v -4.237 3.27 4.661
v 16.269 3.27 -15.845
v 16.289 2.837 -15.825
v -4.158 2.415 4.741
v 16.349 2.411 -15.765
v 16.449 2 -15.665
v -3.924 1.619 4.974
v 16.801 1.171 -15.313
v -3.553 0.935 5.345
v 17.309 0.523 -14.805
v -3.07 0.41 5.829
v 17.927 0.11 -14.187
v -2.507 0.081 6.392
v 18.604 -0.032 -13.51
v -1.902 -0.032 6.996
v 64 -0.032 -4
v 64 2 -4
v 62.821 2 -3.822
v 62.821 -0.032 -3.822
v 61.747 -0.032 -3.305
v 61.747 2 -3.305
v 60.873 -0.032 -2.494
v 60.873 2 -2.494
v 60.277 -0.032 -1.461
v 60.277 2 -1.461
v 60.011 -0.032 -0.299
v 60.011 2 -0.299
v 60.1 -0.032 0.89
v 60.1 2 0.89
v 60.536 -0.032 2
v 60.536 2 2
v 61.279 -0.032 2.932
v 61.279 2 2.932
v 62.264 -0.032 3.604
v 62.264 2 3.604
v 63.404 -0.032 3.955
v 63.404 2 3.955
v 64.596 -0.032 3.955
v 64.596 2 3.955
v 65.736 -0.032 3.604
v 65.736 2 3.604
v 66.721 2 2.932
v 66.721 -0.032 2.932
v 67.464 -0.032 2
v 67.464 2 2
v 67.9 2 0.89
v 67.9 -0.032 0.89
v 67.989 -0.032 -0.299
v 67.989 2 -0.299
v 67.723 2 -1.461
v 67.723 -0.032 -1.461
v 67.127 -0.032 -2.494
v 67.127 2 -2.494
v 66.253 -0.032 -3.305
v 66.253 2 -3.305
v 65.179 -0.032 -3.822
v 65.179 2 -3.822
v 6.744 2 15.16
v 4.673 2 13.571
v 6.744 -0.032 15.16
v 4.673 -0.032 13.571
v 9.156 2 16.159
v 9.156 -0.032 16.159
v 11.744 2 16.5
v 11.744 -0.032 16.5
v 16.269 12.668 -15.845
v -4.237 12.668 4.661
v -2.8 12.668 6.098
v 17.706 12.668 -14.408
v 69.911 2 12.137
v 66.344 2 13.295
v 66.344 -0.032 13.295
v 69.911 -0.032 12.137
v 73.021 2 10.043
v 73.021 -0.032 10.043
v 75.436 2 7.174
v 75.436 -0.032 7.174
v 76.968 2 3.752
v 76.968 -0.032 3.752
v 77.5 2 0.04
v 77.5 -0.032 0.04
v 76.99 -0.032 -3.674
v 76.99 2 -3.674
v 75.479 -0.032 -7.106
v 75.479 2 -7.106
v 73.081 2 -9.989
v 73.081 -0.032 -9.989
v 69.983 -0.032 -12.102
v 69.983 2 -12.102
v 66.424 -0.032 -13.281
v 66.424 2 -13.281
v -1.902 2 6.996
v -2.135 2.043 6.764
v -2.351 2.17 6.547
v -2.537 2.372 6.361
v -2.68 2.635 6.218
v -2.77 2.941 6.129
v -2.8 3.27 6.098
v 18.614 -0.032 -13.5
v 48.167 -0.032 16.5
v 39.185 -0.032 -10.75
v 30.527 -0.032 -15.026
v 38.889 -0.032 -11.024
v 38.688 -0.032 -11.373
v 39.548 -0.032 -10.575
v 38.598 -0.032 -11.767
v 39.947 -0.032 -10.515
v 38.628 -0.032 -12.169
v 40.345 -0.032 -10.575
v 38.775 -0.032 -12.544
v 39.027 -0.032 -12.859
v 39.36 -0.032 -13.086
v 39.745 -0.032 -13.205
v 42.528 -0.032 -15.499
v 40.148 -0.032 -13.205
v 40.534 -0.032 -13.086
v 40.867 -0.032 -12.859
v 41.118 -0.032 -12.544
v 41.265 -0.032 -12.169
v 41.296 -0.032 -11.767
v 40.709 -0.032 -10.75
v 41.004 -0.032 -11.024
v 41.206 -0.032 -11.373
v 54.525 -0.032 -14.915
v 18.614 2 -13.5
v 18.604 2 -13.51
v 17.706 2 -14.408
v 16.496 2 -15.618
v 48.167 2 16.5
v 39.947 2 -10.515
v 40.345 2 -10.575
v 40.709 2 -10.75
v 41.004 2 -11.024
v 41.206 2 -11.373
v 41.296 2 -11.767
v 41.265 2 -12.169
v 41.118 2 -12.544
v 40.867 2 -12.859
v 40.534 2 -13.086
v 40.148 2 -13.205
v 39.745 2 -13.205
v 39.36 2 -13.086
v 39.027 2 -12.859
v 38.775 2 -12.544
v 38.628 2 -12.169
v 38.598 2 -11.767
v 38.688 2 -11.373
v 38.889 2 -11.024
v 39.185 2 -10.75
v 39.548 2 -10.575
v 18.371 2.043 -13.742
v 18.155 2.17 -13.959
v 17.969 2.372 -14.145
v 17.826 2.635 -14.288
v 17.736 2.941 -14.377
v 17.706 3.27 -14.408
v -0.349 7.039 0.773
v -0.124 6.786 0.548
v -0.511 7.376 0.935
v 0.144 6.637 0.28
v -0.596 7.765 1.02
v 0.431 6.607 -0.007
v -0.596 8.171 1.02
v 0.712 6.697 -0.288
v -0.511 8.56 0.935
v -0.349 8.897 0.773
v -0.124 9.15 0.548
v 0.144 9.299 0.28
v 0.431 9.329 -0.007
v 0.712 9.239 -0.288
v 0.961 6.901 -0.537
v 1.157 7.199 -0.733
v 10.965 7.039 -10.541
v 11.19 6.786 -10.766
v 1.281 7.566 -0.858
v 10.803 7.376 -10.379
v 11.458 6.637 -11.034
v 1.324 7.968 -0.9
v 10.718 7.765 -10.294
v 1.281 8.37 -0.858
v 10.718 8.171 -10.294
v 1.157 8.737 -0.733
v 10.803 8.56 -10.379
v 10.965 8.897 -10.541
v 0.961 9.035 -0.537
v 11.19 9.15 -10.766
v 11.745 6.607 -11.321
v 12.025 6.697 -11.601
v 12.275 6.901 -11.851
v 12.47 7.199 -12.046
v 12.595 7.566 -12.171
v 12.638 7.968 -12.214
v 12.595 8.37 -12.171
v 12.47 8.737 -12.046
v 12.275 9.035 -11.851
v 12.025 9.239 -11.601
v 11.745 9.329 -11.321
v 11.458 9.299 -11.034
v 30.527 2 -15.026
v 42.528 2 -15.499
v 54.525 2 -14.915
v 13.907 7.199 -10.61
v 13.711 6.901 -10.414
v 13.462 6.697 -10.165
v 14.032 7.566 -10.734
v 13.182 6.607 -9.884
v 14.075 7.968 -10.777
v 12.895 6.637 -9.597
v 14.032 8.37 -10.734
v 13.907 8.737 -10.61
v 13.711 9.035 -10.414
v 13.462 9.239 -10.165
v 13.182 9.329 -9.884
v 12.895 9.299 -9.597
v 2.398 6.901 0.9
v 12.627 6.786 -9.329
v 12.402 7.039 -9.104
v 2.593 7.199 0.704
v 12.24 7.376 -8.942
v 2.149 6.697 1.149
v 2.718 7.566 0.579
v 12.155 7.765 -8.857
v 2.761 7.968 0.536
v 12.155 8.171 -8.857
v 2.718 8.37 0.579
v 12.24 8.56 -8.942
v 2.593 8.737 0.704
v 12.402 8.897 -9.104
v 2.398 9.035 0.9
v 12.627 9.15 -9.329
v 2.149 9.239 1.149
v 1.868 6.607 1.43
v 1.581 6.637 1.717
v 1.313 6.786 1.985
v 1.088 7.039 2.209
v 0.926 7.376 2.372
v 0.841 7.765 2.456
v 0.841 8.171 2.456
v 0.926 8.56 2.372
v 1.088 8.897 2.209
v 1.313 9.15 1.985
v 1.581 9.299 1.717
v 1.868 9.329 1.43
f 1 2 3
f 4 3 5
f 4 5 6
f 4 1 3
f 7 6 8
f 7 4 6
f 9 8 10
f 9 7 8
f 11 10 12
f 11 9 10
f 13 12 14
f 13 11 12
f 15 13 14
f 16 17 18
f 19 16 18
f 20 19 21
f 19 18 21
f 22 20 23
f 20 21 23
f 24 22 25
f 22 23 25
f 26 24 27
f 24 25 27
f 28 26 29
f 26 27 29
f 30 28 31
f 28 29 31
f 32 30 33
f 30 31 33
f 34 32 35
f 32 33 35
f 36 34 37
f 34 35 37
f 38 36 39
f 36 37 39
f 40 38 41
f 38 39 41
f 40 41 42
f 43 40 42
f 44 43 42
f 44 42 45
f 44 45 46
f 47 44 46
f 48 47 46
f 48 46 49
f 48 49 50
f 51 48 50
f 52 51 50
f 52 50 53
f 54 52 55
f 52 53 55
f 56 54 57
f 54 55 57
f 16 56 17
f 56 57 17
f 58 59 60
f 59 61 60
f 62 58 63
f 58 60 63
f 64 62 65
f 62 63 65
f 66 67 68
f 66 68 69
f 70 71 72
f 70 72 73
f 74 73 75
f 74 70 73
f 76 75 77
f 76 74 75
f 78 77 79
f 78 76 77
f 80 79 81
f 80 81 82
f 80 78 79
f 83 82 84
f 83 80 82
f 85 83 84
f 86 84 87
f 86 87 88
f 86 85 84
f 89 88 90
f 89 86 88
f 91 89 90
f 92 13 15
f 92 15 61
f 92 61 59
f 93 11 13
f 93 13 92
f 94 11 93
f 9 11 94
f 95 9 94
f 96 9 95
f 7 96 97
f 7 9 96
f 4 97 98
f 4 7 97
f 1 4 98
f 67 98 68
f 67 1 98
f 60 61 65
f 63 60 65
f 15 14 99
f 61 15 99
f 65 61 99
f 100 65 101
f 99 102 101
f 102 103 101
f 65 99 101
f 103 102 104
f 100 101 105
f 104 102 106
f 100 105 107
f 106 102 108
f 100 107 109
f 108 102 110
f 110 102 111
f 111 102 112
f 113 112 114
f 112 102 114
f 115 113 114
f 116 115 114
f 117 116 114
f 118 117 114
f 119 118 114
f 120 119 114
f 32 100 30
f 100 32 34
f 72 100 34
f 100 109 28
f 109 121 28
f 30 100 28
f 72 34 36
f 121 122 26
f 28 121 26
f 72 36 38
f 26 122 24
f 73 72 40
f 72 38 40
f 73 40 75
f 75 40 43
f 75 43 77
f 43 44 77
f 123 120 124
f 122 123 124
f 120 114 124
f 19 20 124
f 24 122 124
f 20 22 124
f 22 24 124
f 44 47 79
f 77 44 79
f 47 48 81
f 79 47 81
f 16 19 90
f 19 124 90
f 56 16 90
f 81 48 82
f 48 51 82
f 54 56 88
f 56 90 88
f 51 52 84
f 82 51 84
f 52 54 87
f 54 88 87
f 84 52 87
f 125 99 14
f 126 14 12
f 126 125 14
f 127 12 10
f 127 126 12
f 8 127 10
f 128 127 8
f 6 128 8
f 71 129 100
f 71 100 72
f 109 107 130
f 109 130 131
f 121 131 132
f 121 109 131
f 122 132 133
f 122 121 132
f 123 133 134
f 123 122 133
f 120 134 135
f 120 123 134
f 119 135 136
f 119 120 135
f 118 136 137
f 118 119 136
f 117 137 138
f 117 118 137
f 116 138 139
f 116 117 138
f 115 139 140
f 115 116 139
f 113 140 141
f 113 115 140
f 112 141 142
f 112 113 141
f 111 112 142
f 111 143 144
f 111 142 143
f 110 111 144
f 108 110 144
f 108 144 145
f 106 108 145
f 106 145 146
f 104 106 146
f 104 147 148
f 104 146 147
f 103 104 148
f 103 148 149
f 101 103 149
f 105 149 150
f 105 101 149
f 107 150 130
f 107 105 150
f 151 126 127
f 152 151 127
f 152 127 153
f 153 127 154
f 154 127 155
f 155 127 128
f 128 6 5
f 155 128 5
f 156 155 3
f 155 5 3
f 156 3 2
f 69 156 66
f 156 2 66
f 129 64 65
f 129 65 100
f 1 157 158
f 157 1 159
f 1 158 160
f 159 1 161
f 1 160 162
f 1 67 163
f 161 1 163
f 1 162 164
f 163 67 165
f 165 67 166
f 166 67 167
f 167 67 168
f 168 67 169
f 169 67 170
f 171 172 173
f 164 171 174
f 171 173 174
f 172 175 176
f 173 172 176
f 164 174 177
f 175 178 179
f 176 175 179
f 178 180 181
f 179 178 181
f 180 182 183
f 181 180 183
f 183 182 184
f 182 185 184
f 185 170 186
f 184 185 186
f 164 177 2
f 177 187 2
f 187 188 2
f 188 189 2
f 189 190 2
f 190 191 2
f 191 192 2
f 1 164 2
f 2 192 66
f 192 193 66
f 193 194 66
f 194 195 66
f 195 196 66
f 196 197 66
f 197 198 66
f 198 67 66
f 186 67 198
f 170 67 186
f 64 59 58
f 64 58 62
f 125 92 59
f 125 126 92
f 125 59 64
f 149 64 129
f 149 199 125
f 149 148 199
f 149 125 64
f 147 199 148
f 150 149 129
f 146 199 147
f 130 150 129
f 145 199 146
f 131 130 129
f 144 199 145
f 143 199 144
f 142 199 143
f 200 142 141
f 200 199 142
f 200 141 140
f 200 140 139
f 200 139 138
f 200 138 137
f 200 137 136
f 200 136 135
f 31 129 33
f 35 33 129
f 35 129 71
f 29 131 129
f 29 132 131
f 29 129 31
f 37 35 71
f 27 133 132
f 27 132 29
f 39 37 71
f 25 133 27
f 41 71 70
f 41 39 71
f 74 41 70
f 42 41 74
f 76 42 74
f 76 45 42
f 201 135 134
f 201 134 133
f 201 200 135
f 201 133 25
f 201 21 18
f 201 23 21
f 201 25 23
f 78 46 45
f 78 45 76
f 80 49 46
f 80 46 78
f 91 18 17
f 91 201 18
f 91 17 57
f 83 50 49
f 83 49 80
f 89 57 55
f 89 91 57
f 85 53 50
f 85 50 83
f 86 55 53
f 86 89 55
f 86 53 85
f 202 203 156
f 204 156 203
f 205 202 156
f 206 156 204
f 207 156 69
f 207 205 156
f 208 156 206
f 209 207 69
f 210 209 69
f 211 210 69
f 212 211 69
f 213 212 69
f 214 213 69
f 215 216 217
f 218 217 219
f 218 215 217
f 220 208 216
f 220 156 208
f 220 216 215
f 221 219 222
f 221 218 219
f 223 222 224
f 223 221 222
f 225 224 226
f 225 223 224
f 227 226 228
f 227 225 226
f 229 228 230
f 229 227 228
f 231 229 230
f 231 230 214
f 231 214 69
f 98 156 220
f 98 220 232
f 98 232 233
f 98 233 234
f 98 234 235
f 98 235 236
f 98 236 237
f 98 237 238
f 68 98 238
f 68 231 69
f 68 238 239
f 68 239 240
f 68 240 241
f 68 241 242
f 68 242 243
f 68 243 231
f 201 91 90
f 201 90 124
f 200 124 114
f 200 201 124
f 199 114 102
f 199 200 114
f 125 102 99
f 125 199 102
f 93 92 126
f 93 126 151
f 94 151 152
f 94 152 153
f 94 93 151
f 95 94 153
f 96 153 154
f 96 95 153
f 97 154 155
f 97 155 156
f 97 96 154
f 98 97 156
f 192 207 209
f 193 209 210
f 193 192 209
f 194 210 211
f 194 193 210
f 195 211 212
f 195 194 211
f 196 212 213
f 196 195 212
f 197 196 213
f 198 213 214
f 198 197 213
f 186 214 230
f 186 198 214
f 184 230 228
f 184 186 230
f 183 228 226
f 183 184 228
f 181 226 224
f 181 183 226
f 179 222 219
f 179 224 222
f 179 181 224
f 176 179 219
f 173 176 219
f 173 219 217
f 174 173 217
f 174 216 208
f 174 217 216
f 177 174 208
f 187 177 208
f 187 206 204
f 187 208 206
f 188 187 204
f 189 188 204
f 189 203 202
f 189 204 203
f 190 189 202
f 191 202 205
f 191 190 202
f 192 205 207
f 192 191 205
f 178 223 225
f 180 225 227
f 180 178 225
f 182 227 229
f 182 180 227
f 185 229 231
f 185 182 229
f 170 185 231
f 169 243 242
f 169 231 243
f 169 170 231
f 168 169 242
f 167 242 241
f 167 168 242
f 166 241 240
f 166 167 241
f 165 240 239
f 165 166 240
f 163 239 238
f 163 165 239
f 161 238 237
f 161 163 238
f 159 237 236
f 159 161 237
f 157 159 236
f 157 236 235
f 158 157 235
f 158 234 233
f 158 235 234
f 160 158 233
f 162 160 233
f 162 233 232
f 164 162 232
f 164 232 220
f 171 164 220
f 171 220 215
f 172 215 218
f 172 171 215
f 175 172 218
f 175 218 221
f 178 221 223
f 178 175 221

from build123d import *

# Parameters (mm, degrees)
SKETCH1_R                  = 4
BOSS_EXTRUDE1_DEPTH        = 2.032
BOSS_EXTRUDE3_DEPTH        = 10.668
SKETCH12_R                 = 1.36525
CUT_EXTRUDE2_DEPTH         = 4
CUT_EXTRUDE3_DEPTH         = 6
CUT_EXTRUDE3_DEPTH_BACK    = 1
SKETCH14_R                 = 1.35255
FILLET1_R                  = 10
FLATTEN_BENDS1_START       = 2
FLATTEN_BENDS1_DEPTH       = 10.668
FLATTEN_BENDS1_START_2     = -0.032
FLATTEN_BENDS1_2_OUTLINE_R = 1.36525
FLATTEN_BENDS1_2_DEPTH     = 2.032
PROCESS_BENDS1_START       = -9.067864684
PROCESS_BENDS1_OUTLINE_W   = 29
PROCESS_BENDS1_OUTLINE_H   = 2.032
PROCESS_BENDS1_DEPTH       = 9.398
PROCESS_BENDS1_START_2     = 0.620942425
PROCESS_BENDS1_2_OUTLINE_W = 29
PROCESS_BENDS1_2_OUTLINE_H = 10.668
PROCESS_BENDS1_2_OUTLINE_R = 1.36525
PROCESS_BENDS1_2_DEPTH     = 1.71084748
PROCESS_BENDS1_START_3     = 0.330135316
PROCESS_BENDS1_3_OUTLINE_W = 29
PROCESS_BENDS1_3_OUTLINE_H = 2.032
PROCESS_BENDS1_3_DEPTH     = 0.184274429
PROCESS_BENDS1_START_4     = 0.299789905
PROCESS_BENDS1_4_OUTLINE_W = 29
PROCESS_BENDS1_4_OUTLINE_H = 10.668
PROCESS_BENDS1_4_OUTLINE_R = 1.36525
PROCESS_BENDS1_4_DEPTH     = 3.302
PROCESS_BENDS1_START_5     = -6.292093187
PROCESS_BENDS1_5_DEPTH     = 29


with BuildPart() as part:
    # Sketch1 → Boss-Extrude1 (new body)
    with BuildSketch(Plane(origin=(0, 2, 0), x_dir=(1, 0, 0), z_dir=(0, 1, 0))):
        with BuildLine():
            Line((16.268898369, 15.844931419), (-4.237198285, -4.661165235))
            Line((-4.237198285, -4.661165235), (7.60163648, -16.5))
            Line((7.60163648, -16.5), (48.167251499, -16.5))
            Line((48.167251499, -16.5), (66.344250399, -13.294904666))
            ThreePointArc((66.344250399, -13.294904666), (77.499939542, -0.040402458), (66.423785357, 13.280634945))
            ThreePointArc((66.423785357, 13.280634945), (42.528480772, 15.498562339), (18.613829789, 13.5))
            Line((18.613829789, 13.5), (16.268898369, 15.844931419))
        make_face()
        with Locations(Location((64, 0, 0), (0, 0, 90))):
            Circle(SKETCH1_R, mode=Mode.SUBTRACT)
    extrude(amount=-BOSS_EXTRUDE1_DEPTH)

    # Sketch5 → Boss-Extrude3 (add)
    with BuildSketch(Plane(origin=(0, 2, 0), x_dir=(1, 0, 0), z_dir=(0, 1, 0))):
        Polygon((16.268898369, 15.844931419), (-4.237198285, -4.661165235), (-2.800357306, -6.098006215), (17.705739349, 14.40809044), align=None)
    extrude(amount=BOSS_EXTRUDE3_DEPTH)

    # Sketch12 → Cut-Extrude2 (cut)
    with BuildSketch(Plane(origin=(0.211983475, 0, 0.211983475), x_dir=(-0.7071067811865475, 0, 0.7071067811865477), z_dir=(-0.7071067811865477, 0, -0.7071067811865475))):
        with Locations((-16.207906813, 7.968)):
            Circle(SKETCH12_R)
        with Locations((-0.207906813, 7.968)):
            Circle(SKETCH12_R)
    extrude(amount=-CUT_EXTRUDE2_DEPTH, mode=Mode.SUBTRACT)

    # Sketch14 → Cut-Extrude3 (cut, two sides: drawn at the far end of the back side and taken through both)
    with BuildSketch(Plane(origin=(0, 0, 0), x_dir=(1, 0, 0), z_dir=(0, 1, 0)).offset(-CUT_EXTRUDE3_DEPTH_BACK)):
        with Locations(Location((39.946755384, 11.867587507, 0), (0, 0, 270))):
            Circle(SKETCH14_R)
    extrude(amount=CUT_EXTRUDE3_DEPTH + CUT_EXTRUDE3_DEPTH_BACK, mode=Mode.SUBTRACT)

    # Fillet1
    fillet1_edges = [part.edges().sort_by_distance(p)[0] for p in [
        (7.60163648, 0.984, 16.5),
    ]]
    fillet(fillet1_edges, radius=FILLET1_R)

    # Flatten-Bends1: read off the stored shape, not the designer's step
    # Flatten-Bends1 outline → Flatten-Bends1 (cut)
    with BuildSketch(Plane(origin=(0, 0, 0), x_dir=(1, 0, 0), z_dir=(0, 1, 0)).offset(FLATTEN_BENDS1_START)):
        Polygon((17.705739349, 14.40809044), (16.290355815, 15.823473974), (16.268898369, 15.844931419), (-4.237198285, -4.661165235), (-2.800357306, -6.098006215), align=None)
    extrude(amount=FLATTEN_BENDS1_DEPTH, mode=Mode.SUBTRACT)

    # Flatten-Bends1 2 outline → Flatten-Bends1 2 (add)
    with BuildSketch(Plane(origin=(0, 0, 0), x_dir=(1, 0, 0), z_dir=(0, 1, 0)).offset(FLATTEN_BENDS1_START_2)):
        Polygon((-4.237198285, -4.661165235), (16.268898369, 15.844931419), (9.644966285, 22.468863503), (-10.861130369, 1.962766849), align=None)
        with Locations((-2.94153442, 3.235559055)):
            Circle(FLATTEN_BENDS1_2_OUTLINE_R, mode=Mode.SUBTRACT)
        with Locations((8.372174079, 14.549267554)):
            Circle(FLATTEN_BENDS1_2_OUTLINE_R, mode=Mode.SUBTRACT)
    extrude(amount=FLATTEN_BENDS1_2_DEPTH)

    # Process-Bends1: read off the stored shape, not the designer's step
    # Process-Bends1 outline → Process-Bends1 (cut)
    with BuildSketch(Plane(origin=(0, 0, 0), x_dir=(0.7071067811865474, 0, -0.7071067811865477), z_dir=(0.7071067811865476, 0, 0.7071067811865476)).offset(PROCESS_BENDS1_START)):
        with Locations((8.207906813, 0.984)):
            Rectangle(PROCESS_BENDS1_OUTLINE_W, PROCESS_BENDS1_OUTLINE_H)
    extrude(amount=PROCESS_BENDS1_DEPTH, mode=Mode.SUBTRACT)

    # Process-Bends1 2 outline → Process-Bends1 2 (add)
    with BuildSketch(Plane(origin=(0, 0, 0), x_dir=(0.7071067811865474, 0, -0.7071067811865477), z_dir=(0.7071067811865476, 0, 0.7071067811865476)).offset(PROCESS_BENDS1_START_2)):
        with Locations((8.207906813, 7.334)):
            Rectangle(PROCESS_BENDS1_2_OUTLINE_W, PROCESS_BENDS1_2_OUTLINE_H)
        with Locations((0.207906813, 7.968)):
            Circle(PROCESS_BENDS1_2_OUTLINE_R, mode=Mode.SUBTRACT)
        with Locations((16.207906813, 7.968)):
            Circle(PROCESS_BENDS1_2_OUTLINE_R, mode=Mode.SUBTRACT)
    extrude(amount=PROCESS_BENDS1_2_DEPTH)

    # Process-Bends1 3 outline → Process-Bends1 3 (cut)
    with BuildSketch(Plane(origin=(0, 0, 0), x_dir=(0.7071067811865474, 0, -0.7071067811865477), z_dir=(0.7071067811865476, 0, 0.7071067811865476)).offset(PROCESS_BENDS1_START_3)):
        with Locations((8.207906813, 0.984)):
            Rectangle(PROCESS_BENDS1_3_OUTLINE_W, PROCESS_BENDS1_3_OUTLINE_H)
    extrude(amount=PROCESS_BENDS1_3_DEPTH, mode=Mode.SUBTRACT)

    # Process-Bends1 4 outline → Process-Bends1 4 (add)
    with BuildSketch(Plane(origin=(0, 0, 0), x_dir=(0.7071067811865474, 0, -0.7071067811865477), z_dir=(0.7071067811865476, 0, 0.7071067811865476)).offset(PROCESS_BENDS1_START_4)):
        with Locations((8.207906813, 7.334)):
            Rectangle(PROCESS_BENDS1_4_OUTLINE_W, PROCESS_BENDS1_4_OUTLINE_H)
        with Locations((0.207906813, 7.968)):
            Circle(PROCESS_BENDS1_4_OUTLINE_R, mode=Mode.SUBTRACT)
        with Locations((16.207906813, 7.968)):
            Circle(PROCESS_BENDS1_4_OUTLINE_R, mode=Mode.SUBTRACT)
    extrude(amount=PROCESS_BENDS1_4_DEPTH)

    # Process-Bends1 5 outline → Process-Bends1 5 (cut)
    with BuildSketch(Plane(origin=(0, 0, 0), x_dir=(0.707106781186548, 0, 0.707106781186547), z_dir=(0.707106781186547, 0, -0.707106781186548)).offset(PROCESS_BENDS1_START_5)):
        with BuildLine():
            ThreePointArc((3.601789905, -2), (2.703764293, -2.371974388), (2.331789905, -3.27))
            Line((2.331789905, -3.27), (2.331789905, -12.668))
            Line((2.331789905, -12.668), (3.601789905, -12.668))
            Line((3.601789905, -12.668), (3.601789905, -2))
        make_face()
        with BuildLine():
            Line((0.299789905, -2), (0.299789905, -3.27))
            ThreePointArc((0.299789905, -3.27), (1.266923314, -0.935133409), (3.601789905, 0.032))
            Line((3.601789905, 0.032), (0.514409745, 0.032))
            Line((0.514409745, 0.032), (0.514409745, -2))
            Line((0.514409745, -2), (0.299789905, -2))
        make_face()
    extrude(amount=PROCESS_BENDS1_5_DEPTH, mode=Mode.SUBTRACT)


solid = part.part
